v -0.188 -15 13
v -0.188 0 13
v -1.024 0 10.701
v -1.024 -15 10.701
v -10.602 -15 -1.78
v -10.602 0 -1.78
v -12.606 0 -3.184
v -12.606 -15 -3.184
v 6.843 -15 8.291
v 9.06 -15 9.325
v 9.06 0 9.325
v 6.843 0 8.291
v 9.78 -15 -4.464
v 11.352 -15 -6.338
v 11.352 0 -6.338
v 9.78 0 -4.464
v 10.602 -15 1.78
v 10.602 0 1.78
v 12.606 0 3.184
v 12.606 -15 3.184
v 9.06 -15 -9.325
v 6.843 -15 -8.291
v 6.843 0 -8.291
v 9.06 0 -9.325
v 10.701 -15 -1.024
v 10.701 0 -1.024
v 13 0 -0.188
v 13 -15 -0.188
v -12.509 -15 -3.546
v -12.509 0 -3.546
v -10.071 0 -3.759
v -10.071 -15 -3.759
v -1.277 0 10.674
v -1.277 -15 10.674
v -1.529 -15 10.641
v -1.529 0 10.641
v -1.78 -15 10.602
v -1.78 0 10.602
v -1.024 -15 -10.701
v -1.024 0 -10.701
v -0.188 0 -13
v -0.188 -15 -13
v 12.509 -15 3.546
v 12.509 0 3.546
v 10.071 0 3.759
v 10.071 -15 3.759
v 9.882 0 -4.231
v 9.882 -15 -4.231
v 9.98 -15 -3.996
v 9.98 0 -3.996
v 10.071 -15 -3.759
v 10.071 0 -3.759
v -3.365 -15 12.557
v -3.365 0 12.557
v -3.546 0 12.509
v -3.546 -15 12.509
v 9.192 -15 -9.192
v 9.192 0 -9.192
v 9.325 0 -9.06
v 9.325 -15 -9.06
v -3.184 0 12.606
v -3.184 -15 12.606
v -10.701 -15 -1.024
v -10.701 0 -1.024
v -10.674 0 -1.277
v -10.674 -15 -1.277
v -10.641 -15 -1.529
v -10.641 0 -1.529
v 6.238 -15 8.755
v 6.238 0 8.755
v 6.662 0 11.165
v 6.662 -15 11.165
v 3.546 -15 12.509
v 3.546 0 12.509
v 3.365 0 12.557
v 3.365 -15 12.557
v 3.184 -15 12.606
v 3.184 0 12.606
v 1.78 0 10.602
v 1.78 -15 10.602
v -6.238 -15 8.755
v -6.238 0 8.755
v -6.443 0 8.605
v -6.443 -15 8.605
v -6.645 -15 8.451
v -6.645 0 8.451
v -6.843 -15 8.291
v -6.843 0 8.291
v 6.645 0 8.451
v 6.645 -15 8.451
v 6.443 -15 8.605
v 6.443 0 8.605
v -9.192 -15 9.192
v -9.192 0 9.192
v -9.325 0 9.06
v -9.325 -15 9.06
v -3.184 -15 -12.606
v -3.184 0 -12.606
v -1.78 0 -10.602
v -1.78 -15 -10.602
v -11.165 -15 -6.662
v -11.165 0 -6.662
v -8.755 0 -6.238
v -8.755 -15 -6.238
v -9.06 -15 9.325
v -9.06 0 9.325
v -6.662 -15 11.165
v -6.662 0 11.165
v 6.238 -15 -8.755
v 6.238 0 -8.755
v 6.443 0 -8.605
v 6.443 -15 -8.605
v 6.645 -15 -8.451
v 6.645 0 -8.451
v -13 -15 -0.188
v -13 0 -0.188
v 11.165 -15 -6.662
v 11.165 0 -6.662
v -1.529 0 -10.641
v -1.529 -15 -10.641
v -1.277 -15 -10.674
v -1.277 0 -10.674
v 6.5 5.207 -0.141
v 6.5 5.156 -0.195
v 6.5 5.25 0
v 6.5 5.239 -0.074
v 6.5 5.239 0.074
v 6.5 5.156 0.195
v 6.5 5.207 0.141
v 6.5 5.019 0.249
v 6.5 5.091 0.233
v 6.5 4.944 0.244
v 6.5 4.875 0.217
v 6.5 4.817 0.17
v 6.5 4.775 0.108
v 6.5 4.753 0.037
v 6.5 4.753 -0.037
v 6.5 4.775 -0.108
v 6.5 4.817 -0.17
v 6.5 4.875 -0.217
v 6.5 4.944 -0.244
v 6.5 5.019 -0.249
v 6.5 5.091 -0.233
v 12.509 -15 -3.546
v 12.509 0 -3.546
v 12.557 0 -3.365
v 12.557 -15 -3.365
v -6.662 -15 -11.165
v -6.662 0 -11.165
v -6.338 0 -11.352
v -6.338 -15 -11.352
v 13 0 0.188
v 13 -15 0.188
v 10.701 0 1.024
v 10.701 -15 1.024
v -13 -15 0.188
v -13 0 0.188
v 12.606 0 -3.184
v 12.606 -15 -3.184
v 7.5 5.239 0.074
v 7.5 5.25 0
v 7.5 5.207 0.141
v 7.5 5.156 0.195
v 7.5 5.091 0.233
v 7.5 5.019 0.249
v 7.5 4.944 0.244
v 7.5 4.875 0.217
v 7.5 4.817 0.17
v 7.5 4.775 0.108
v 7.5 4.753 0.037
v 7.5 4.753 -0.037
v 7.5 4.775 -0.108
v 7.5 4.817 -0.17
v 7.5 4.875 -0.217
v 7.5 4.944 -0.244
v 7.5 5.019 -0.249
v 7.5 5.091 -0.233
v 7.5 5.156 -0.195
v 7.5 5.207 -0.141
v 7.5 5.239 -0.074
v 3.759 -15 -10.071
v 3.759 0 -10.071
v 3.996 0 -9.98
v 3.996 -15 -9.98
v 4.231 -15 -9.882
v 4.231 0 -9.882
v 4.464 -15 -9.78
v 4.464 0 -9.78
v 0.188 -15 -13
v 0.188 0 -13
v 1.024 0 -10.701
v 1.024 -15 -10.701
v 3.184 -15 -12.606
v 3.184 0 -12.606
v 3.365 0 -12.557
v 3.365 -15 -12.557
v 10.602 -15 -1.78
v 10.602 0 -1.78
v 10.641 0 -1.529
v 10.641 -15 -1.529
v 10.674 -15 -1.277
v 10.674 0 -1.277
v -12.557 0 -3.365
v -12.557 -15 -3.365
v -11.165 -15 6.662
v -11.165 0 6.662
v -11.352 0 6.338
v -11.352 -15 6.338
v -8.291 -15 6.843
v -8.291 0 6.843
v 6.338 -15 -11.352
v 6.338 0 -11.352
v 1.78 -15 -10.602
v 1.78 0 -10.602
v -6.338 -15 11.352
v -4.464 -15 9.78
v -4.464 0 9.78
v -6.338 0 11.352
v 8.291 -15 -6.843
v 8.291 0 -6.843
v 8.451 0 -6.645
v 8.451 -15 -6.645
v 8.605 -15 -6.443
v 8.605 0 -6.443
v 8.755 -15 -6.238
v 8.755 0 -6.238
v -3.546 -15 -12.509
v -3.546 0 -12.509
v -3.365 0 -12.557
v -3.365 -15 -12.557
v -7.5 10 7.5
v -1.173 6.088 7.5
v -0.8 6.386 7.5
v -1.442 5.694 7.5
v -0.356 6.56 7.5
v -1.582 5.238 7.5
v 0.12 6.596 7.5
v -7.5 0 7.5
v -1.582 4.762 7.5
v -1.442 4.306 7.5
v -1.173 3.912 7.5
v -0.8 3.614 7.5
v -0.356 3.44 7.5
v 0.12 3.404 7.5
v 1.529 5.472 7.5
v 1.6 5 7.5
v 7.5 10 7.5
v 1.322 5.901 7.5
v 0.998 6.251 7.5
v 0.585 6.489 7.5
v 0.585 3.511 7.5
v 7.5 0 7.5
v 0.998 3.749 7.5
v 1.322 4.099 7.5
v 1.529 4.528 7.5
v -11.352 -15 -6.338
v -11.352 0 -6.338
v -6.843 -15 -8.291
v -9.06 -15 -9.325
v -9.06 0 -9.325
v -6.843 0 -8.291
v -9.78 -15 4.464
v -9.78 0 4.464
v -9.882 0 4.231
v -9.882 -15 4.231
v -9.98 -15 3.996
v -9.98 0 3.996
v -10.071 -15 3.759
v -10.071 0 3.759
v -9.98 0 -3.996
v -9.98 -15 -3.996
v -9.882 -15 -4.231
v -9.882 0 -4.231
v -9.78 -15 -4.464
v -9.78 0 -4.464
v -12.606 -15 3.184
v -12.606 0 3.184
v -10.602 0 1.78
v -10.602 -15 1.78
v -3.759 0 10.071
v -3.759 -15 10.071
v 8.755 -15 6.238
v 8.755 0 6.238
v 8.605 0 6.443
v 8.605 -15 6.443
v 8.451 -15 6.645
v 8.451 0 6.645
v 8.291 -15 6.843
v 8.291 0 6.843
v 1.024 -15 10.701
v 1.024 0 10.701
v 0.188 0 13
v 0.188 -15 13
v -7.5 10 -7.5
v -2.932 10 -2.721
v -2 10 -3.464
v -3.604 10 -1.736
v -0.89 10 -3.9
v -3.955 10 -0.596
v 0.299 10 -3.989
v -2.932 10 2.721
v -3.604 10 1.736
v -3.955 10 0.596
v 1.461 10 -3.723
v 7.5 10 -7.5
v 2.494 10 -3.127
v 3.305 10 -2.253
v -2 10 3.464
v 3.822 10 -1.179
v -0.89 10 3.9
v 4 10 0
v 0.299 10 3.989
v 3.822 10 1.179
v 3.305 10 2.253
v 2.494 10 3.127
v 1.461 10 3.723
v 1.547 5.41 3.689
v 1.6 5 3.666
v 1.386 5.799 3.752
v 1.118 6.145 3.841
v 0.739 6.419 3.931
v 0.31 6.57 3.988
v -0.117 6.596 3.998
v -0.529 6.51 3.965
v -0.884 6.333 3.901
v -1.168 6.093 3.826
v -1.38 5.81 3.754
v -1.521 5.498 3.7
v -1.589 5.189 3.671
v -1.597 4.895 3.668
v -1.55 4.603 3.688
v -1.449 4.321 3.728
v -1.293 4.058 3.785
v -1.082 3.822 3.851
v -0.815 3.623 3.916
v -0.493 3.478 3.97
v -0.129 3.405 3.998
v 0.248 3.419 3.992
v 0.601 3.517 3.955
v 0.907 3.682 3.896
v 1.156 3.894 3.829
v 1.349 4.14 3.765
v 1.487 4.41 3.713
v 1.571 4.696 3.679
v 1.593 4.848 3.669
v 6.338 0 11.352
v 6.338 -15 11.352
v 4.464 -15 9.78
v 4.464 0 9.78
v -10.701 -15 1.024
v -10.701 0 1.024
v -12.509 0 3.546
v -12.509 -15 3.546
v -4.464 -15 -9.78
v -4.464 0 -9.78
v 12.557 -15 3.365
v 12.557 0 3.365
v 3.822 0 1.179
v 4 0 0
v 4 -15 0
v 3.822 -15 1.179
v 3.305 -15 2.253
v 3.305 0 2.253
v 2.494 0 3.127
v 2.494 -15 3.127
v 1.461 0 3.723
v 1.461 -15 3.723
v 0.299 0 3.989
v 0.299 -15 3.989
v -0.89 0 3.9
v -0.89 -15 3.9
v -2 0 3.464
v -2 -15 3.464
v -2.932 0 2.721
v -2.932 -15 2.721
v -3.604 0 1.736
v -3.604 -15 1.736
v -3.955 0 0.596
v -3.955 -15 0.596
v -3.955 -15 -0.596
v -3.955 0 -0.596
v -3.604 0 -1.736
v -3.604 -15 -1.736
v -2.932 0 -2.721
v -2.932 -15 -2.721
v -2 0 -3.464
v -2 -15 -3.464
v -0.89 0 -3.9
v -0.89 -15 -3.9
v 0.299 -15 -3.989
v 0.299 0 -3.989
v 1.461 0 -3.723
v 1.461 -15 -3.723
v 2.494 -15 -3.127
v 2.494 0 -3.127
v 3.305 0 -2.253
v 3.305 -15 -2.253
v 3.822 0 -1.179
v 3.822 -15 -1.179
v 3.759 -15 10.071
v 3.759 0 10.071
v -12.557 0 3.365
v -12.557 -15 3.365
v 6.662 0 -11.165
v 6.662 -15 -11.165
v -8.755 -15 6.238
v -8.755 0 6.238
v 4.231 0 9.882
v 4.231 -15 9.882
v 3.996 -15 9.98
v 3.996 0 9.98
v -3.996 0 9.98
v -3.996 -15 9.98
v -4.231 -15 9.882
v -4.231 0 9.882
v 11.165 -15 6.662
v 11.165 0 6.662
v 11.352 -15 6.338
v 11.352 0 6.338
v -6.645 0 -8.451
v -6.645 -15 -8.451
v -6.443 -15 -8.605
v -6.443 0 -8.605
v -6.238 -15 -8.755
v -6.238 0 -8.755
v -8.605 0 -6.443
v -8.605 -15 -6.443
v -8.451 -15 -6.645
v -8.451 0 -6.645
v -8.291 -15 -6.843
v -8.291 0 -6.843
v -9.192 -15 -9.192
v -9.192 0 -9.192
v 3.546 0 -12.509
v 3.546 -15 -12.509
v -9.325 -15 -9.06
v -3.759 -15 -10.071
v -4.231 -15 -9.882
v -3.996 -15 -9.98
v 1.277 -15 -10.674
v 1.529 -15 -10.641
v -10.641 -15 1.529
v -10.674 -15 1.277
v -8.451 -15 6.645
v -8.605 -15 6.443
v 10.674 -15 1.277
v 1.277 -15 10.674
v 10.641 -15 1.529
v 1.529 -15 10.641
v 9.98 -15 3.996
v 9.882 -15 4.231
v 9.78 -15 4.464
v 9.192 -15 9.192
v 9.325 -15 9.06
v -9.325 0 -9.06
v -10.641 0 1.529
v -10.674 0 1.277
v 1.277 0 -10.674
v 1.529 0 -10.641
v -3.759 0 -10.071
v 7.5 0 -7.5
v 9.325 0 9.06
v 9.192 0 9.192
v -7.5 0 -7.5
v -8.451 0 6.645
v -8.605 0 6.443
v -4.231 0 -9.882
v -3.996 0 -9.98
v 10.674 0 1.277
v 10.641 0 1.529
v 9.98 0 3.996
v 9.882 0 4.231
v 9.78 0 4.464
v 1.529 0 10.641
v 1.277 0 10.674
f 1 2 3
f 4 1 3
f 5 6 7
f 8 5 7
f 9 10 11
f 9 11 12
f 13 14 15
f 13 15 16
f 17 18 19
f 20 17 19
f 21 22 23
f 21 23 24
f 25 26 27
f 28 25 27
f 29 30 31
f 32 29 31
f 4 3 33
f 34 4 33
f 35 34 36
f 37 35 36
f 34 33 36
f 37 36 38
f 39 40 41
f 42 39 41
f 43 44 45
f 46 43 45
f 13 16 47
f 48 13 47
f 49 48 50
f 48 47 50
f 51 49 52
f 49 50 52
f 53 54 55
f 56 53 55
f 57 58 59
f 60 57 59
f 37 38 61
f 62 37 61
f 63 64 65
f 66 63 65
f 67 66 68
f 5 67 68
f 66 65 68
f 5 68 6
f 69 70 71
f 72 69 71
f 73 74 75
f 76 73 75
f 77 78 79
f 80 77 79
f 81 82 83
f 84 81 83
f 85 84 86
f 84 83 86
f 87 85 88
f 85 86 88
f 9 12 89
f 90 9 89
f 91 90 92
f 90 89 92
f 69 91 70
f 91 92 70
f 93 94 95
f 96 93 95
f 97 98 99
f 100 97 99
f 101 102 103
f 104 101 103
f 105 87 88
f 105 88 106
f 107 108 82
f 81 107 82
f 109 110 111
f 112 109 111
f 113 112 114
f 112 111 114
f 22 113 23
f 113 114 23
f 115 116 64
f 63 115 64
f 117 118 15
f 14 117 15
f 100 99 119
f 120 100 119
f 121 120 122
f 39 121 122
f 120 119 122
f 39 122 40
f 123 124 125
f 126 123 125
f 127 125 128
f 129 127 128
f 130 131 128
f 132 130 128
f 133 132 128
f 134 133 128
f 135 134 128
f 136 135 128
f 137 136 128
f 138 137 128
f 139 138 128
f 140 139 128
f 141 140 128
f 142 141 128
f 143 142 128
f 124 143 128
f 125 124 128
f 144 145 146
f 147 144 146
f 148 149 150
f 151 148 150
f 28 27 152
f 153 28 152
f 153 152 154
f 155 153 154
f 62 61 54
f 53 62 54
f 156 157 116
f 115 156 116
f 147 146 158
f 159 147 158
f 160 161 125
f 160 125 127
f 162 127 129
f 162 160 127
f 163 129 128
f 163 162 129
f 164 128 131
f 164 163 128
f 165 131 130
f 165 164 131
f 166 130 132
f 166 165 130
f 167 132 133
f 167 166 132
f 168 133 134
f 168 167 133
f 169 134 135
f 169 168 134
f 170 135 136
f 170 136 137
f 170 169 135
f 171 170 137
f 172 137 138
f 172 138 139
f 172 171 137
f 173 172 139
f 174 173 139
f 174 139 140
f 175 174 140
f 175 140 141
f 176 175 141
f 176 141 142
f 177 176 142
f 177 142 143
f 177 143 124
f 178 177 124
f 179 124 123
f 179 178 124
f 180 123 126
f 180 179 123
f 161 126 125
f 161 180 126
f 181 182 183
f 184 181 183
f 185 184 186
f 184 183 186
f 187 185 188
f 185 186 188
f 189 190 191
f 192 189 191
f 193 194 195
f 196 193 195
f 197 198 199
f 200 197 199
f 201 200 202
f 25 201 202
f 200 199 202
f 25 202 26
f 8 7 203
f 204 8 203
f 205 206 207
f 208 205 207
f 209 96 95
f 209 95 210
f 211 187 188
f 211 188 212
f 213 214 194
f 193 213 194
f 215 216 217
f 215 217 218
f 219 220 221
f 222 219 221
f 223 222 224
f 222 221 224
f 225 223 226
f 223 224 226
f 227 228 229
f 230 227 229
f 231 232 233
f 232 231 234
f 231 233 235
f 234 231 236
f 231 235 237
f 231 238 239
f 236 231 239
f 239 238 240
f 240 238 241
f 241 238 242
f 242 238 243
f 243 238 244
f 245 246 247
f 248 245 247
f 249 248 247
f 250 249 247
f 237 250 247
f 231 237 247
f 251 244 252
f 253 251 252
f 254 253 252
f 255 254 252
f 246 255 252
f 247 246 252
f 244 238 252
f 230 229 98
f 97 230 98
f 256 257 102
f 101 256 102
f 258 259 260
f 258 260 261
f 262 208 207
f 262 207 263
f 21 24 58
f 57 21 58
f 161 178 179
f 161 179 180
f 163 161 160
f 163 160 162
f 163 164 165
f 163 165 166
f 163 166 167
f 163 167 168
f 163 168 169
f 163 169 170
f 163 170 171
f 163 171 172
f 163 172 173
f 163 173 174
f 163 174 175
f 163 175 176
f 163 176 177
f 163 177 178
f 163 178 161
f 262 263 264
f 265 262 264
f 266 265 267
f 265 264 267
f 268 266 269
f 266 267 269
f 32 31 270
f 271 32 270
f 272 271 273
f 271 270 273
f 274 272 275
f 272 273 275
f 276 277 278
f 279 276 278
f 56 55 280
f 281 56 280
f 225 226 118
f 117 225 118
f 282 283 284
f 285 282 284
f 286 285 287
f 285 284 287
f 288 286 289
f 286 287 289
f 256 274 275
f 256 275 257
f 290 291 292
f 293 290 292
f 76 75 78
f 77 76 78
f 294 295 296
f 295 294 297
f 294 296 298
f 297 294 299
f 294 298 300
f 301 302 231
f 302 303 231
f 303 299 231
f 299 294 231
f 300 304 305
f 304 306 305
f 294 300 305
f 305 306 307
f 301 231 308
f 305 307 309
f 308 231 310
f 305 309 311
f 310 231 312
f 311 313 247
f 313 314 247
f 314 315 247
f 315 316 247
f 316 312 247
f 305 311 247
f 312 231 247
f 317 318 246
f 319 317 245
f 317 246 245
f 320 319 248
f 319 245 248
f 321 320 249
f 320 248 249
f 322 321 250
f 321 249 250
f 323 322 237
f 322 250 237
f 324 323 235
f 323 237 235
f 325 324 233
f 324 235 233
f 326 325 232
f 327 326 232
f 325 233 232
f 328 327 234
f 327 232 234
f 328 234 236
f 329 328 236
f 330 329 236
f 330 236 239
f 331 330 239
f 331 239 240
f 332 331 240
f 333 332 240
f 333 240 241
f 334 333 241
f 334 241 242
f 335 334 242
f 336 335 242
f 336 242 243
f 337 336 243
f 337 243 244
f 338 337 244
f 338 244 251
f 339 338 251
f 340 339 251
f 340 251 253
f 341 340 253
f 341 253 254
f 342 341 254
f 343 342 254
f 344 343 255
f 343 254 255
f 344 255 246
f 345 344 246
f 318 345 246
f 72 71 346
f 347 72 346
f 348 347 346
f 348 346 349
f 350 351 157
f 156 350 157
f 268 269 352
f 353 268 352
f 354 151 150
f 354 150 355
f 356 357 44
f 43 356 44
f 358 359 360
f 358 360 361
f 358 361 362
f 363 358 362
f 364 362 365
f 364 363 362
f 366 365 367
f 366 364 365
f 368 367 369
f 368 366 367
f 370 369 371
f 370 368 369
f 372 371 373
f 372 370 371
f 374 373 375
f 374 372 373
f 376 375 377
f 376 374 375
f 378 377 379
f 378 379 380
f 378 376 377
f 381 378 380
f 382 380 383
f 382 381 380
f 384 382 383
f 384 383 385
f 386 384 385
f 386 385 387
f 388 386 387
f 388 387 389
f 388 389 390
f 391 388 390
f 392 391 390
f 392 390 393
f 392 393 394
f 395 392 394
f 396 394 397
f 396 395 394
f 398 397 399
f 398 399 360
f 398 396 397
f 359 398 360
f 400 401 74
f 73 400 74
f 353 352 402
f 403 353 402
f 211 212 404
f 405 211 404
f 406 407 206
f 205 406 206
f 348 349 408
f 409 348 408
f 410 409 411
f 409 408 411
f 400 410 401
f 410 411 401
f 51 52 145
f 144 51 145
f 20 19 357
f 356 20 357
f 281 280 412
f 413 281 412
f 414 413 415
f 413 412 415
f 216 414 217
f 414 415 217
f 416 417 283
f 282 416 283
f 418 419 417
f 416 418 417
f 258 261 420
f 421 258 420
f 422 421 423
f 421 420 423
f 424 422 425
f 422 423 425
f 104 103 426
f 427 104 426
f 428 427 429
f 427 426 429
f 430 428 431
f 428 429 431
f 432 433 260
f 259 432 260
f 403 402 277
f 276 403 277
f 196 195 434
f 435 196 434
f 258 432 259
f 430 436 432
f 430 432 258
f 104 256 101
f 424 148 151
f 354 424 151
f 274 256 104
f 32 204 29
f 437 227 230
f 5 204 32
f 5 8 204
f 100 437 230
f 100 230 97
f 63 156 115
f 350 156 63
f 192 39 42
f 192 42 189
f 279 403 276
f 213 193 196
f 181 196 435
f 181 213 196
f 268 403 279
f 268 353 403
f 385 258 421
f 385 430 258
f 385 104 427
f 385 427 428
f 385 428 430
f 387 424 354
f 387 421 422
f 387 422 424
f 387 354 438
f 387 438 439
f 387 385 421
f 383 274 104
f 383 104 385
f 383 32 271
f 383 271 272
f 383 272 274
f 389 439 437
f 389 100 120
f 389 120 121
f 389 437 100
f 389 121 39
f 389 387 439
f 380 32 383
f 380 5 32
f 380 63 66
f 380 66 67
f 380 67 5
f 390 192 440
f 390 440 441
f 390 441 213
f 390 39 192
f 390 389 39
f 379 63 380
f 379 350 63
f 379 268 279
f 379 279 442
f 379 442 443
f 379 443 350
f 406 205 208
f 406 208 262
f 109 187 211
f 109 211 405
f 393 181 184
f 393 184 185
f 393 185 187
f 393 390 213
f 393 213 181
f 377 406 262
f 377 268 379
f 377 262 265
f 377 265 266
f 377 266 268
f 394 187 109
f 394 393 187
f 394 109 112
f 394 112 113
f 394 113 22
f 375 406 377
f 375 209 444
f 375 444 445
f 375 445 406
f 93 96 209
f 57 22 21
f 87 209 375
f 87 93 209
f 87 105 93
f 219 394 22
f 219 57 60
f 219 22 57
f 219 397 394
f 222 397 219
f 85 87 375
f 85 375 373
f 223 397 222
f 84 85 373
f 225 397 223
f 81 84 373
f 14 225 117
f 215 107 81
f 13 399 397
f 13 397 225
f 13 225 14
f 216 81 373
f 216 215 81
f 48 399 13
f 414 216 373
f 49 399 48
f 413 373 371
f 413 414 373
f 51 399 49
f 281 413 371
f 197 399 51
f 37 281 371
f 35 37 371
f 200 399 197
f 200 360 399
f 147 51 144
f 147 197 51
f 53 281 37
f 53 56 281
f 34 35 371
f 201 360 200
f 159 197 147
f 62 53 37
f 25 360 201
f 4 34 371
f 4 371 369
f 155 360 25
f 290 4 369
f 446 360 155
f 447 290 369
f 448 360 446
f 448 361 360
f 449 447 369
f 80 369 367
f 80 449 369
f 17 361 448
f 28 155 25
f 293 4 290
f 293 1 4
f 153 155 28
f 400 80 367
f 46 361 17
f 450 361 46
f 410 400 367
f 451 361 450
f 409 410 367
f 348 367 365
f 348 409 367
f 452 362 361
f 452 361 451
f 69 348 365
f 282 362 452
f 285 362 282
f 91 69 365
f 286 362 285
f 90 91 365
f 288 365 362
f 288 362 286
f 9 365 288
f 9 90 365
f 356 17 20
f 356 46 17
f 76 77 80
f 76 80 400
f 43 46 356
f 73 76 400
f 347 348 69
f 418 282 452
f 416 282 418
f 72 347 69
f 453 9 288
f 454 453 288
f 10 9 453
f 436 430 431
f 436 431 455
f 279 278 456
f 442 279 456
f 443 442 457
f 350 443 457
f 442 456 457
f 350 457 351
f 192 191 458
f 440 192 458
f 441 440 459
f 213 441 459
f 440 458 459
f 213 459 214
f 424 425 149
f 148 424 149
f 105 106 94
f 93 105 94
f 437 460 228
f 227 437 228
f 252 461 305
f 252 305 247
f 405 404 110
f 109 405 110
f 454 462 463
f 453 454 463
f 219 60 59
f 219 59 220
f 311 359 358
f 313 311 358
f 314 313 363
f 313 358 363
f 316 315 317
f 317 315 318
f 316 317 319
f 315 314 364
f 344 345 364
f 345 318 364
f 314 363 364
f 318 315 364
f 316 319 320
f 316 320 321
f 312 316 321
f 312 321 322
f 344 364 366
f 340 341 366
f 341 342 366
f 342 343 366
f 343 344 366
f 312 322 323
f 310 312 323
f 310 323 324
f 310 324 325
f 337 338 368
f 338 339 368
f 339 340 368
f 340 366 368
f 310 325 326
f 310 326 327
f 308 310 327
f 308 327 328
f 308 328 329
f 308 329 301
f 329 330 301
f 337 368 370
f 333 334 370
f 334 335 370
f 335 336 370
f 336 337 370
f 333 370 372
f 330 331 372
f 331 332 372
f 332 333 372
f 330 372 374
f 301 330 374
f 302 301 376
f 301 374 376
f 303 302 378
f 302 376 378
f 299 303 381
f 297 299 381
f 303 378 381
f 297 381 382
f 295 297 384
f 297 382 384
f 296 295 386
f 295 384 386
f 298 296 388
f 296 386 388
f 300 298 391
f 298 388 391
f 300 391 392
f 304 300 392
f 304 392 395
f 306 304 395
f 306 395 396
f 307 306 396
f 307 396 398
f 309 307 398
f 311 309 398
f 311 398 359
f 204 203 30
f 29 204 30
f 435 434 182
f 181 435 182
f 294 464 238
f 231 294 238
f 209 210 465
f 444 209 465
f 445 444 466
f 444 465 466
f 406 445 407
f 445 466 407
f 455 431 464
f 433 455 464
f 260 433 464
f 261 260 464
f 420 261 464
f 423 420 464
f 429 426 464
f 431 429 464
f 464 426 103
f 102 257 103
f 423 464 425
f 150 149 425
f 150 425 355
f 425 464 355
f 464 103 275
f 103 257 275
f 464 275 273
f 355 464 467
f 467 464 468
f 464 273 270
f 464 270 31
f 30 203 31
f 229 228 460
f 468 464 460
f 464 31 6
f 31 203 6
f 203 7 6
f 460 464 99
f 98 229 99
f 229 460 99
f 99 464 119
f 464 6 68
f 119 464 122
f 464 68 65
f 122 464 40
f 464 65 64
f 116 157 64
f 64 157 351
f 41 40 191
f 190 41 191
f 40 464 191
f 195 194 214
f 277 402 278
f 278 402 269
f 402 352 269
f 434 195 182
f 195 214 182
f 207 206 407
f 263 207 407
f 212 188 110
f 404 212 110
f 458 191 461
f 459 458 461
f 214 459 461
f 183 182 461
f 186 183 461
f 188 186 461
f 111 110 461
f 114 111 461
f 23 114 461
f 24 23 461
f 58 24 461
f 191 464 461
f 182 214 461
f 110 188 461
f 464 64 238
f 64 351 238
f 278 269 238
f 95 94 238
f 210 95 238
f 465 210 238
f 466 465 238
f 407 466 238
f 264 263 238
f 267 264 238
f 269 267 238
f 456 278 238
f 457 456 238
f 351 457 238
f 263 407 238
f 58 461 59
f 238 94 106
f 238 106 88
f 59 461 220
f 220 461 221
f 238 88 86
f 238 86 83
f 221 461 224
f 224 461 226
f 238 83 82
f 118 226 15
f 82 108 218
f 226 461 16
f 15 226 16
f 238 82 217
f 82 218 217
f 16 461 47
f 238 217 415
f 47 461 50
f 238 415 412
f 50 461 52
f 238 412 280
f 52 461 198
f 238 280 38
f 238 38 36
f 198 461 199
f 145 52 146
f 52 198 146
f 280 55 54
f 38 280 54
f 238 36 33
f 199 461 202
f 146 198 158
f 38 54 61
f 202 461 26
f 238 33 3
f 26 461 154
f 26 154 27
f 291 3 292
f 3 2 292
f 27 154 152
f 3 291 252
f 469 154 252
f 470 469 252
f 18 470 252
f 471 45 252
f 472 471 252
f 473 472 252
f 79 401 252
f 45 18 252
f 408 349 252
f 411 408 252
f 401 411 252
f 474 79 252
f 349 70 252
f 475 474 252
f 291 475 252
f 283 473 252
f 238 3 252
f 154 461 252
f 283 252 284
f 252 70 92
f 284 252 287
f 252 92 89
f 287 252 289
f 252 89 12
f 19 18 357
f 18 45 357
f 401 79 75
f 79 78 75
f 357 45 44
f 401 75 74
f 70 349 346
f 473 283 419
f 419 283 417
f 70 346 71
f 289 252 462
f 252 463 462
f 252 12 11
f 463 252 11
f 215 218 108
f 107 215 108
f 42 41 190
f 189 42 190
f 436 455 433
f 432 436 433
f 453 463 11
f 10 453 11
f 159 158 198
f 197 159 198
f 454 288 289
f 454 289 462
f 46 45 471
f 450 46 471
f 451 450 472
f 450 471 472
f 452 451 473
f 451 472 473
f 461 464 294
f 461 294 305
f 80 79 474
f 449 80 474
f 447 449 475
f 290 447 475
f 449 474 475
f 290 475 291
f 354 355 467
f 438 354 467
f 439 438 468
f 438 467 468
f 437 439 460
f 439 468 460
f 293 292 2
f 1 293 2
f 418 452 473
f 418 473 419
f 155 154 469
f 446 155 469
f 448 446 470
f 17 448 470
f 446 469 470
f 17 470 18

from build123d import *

# Parameters (mm, degrees)
F0_R     = 4
F1_DEPTH = 15
F2_W     = 15
F2_H     = 15
F2_R     = 4
F3_DEPTH = 10
F4_R     = 1.6
F5_DEPTH = 4.833939544
F6_R     = 0.25
F7_DEPTH = 1


with BuildPart() as f1:
    # F0 (on Front) → F1 (new body)
    with BuildSketch(Plane.XZ):
        with BuildLine():
            ThreePointArc((10.701095609, -1.0242327697), (10.7377669419, -0.5126998162), (10.75, 0))
            ThreePointArc((10.75, 0), (10.7377669419, 0.5126998162), (10.701095609, 1.0242327697))
            ThreePointArc((10.701095609, 1.0242327697), (10.6580322598, 1.4031565664), (10.6015555658, 1.7803144627))
            ThreePointArc((10.6015555658, 1.7803144627), (10.3837026326, 2.7823047349), (10.0713736709, 3.7589802315))
            ThreePointArc((10.0713736709, 3.7589802315), (9.9317049745, 4.1138468979), (9.7795370306, 4.4635362065))
            ThreePointArc((9.7795370306, 4.4635362065), (9.3097730907, 5.375), (8.7553042609, 6.2375594025))
            ThreePointArc((8.7553042609, 6.2375594025), (8.5285484081, 6.5441853618), (8.2910592083, 6.8425753343))
            ThreePointArc((8.2910592083, 6.8425753343), (7.6013978978, 7.6013978978), (6.8425753343, 8.2910592083))
            ThreePointArc((6.8425753343, 8.2910592083), (6.5441853618, 8.5285484081), (6.2375594025, 8.7553042609))
            ThreePointArc((6.2375594025, 8.7553042609), (5.375, 9.3097730907), (4.4635362065, 9.7795370306))
            ThreePointArc((4.4635362065, 9.7795370306), (4.1138468979, 9.9317049745), (3.7589802315, 10.0713736709))
            ThreePointArc((3.7589802315, 10.0713736709), (2.7823047349, 10.3837026326), (1.7803144627, 10.6015555658))
            ThreePointArc((1.7803144627, 10.6015555658), (1.4031565664, 10.6580322598), (1.0242327697, 10.701095609))
            ThreePointArc((1.0242327697, 10.701095609), (0, 10.75), (-1.0242327697, 10.701095609))
            ThreePointArc((-1.0242327697, 10.701095609), (-1.4031565664, 10.6580322598), (-1.7803144627, 10.6015555658))
            ThreePointArc((-1.7803144627, 10.6015555658), (-2.7823047349, 10.3837026326), (-3.7589802315, 10.0713736709))
            ThreePointArc((-3.7589802315, 10.0713736709), (-4.1138468979, 9.9317049745), (-4.4635362065, 9.7795370306))
            ThreePointArc((-4.4635362065, 9.7795370306), (-5.375, 9.3097730907), (-6.2375594025, 8.7553042609))
            ThreePointArc((-6.2375594025, 8.7553042609), (-6.5441853618, 8.5285484081), (-6.8425753343, 8.2910592083))
            ThreePointArc((-6.8425753343, 8.2910592083), (-7.6013978978, 7.6013978978), (-8.2910592083, 6.8425753343))
            ThreePointArc((-8.2910592083, 6.8425753343), (-8.5285484081, 6.5441853618), (-8.7553042609, 6.2375594025))
            ThreePointArc((-8.7553042609, 6.2375594025), (-9.3097730907, 5.375), (-9.7795370306, 4.4635362065))
            ThreePointArc((-9.7795370306, 4.4635362065), (-9.9317049745, 4.1138468979), (-10.0713736709, 3.7589802315))
            ThreePointArc((-10.0713736709, 3.7589802315), (-10.3837026326, 2.7823047349), (-10.6015555658, 1.7803144627))
            ThreePointArc((-10.6015555658, 1.7803144627), (-10.6580322598, 1.4031565664), (-10.701095609, 1.0242327697))
            ThreePointArc((-10.701095609, 1.0242327697), (-10.75, 0), (-10.701095609, -1.0242327697))
            ThreePointArc((-10.701095609, -1.0242327697), (-10.6580322598, -1.4031565664), (-10.6015555658, -1.7803144627))
            ThreePointArc((-10.6015555658, -1.7803144627), (-10.3837026326, -2.7823047349), (-10.0713736709, -3.7589802315))
            ThreePointArc((-10.0713736709, -3.7589802315), (-9.9317049745, -4.1138468979), (-9.7795370306, -4.4635362065))
            ThreePointArc((-9.7795370306, -4.4635362065), (-9.3097730907, -5.375), (-8.7553042609, -6.2375594025))
            ThreePointArc((-8.7553042609, -6.2375594025), (-8.5285484081, -6.5441853618), (-8.2910592083, -6.8425753343))
            ThreePointArc((-8.2910592083, -6.8425753343), (-7.6013978978, -7.6013978978), (-6.8425753343, -8.2910592083))
            ThreePointArc((-6.8425753343, -8.2910592083), (-6.5441853618, -8.5285484081), (-6.2375594025, -8.7553042609))
            ThreePointArc((-6.2375594025, -8.7553042609), (-5.375, -9.3097730907), (-4.4635362065, -9.7795370306))
            ThreePointArc((-4.4635362065, -9.7795370306), (-4.1138468979, -9.9317049745), (-3.7589802315, -10.0713736709))
            ThreePointArc((-3.7589802315, -10.0713736709), (-2.7823047349, -10.3837026326), (-1.7803144627, -10.6015555658))
            ThreePointArc((-1.7803144627, -10.6015555658), (-1.4031565664, -10.6580322598), (-1.0242327697, -10.701095609))
            ThreePointArc((-1.0242327697, -10.701095609), (0, -10.75), (1.0242327697, -10.701095609))
            ThreePointArc((1.0242327697, -10.701095609), (1.4031565664, -10.6580322598), (1.7803144627, -10.6015555658))
            ThreePointArc((1.7803144627, -10.6015555658), (2.7823047349, -10.3837026326), (3.7589802315, -10.0713736709))
            ThreePointArc((3.7589802315, -10.0713736709), (4.1138468979, -9.9317049745), (4.4635362065, -9.7795370306))
            ThreePointArc((4.4635362065, -9.7795370306), (5.375, -9.3097730907), (6.2375594025, -8.7553042609))
            ThreePointArc((6.2375594025, -8.7553042609), (6.5441853618, -8.5285484081), (6.8425753343, -8.2910592083))
            ThreePointArc((6.8425753343, -8.2910592083), (7.6013978978, -7.6013978978), (8.2910592083, -6.8425753343))
            ThreePointArc((8.2910592083, -6.8425753343), (8.5285484081, -6.5441853618), (8.7553042609, -6.2375594025))
            ThreePointArc((8.7553042609, -6.2375594025), (9.3097730907, -5.375), (9.7795370306, -4.4635362065))
            ThreePointArc((9.7795370306, -4.4635362065), (9.9317049745, -4.1138468979), (10.0713736709, -3.7589802315))
            ThreePointArc((10.0713736709, -3.7589802315), (10.3837026326, -2.7823047349), (10.6015555658, -1.7803144627))
            ThreePointArc((10.6015555658, -1.7803144627), (10.6580322598, -1.4031565664), (10.701095609, -1.0242327697))
        make_face()
        Circle(F0_R, mode=Mode.SUBTRACT)
        with BuildLine():
            ThreePointArc((10.701095609, 1.0242327697), (10.7377669419, 0.5126998162), (10.75, 0))
            ThreePointArc((10.75, 0), (10.7377669419, -0.5126998162), (10.701095609, -1.0242327697))
            Line((10.701095609, -1.0242327697), (13, -0.1875))
            Line((13, -0.1875), (13, 0))
            Line((13, 0), (13, 0.1875))
            Line((13, 0.1875), (10.701095609, 1.0242327697))
        make_face()
        with BuildLine():
            ThreePointArc((10.0713736709, 3.7589802315), (10.3837026326, 2.7823047349), (10.6015555658, 1.7803144627))
            Line((10.6015555658, 1.7803144627), (12.6055643127, 3.1835364939))
            Line((12.6055643127, 3.1835364939), (12.5570357418, 3.3646475863))
            Line((12.5570357418, 3.3646475863), (12.5085071708, 3.5457586788))
            Line((12.5085071708, 3.5457586788), (10.0713736709, 3.7589802315))
        make_face()
        with BuildLine():
            Line((12.6055643127, -3.1835364939), (10.6015555658, -1.7803144627))
            ThreePointArc((10.6015555658, -1.7803144627), (10.3837026326, -2.7823047349), (10.0713736709, -3.7589802315))
            Line((10.0713736709, -3.7589802315), (12.5085071708, -3.5457586788))
            Line((12.5085071708, -3.5457586788), (12.5570357418, -3.3646475863))
            Line((12.5570357418, -3.3646475863), (12.6055643127, -3.1835364939))
        make_face()
        with BuildLine():
            ThreePointArc((8.7553042609, 6.2375594025), (9.3097730907, 5.375), (9.7795370306, 4.4635362065))
            Line((9.7795370306, 4.4635362065), (11.3520802492, 6.3376202368))
            Line((11.3520802492, 6.3376202368), (11.2583302492, 6.5))
            Line((11.2583302492, 6.5), (11.1645802492, 6.6623797632))
            Line((11.1645802492, 6.6623797632), (8.7553042609, 6.2375594025))
        make_face()
        with BuildLine():
            Line((11.3520802492, -6.3376202368), (9.7795370306, -4.4635362065))
            ThreePointArc((9.7795370306, -4.4635362065), (9.3097730907, -5.375), (8.7553042609, -6.2375594025))
            Line((8.7553042609, -6.2375594025), (11.1645802492, -6.6623797632))
            Line((11.1645802492, -6.6623797632), (11.2583302492, -6.5))
            Line((11.2583302492, -6.5), (11.3520802492, -6.3376202368))
        make_face()
        with BuildLine():
            ThreePointArc((6.8425753343, 8.2910592083), (7.6013978978, 7.6013978978), (8.2910592083, 6.8425753343))
            Line((8.2910592083, 6.8425753343), (9.3249706769, 9.059805634))
            Line((9.3249706769, 9.059805634), (9.1923881554, 9.1923881554))
            Line((9.1923881554, 9.1923881554), (9.059805634, 9.3249706769))
            Line((9.059805634, 9.3249706769), (6.8425753343, 8.2910592083))
        make_face()
        with BuildLine():
            Line((9.3249706769, -9.059805634), (8.2910592083, -6.8425753343))
            ThreePointArc((8.2910592083, -6.8425753343), (7.6013978978, -7.6013978978), (6.8425753343, -8.2910592083))
            Line((6.8425753343, -8.2910592083), (9.059805634, -9.3249706769))
            Line((9.059805634, -9.3249706769), (9.1923881554, -9.1923881554))
            Line((9.1923881554, -9.1923881554), (9.3249706769, -9.059805634))
        make_face()
        with BuildLine():
            ThreePointArc((4.4635362065, 9.7795370306), (5.375, 9.3097730907), (6.2375594025, 8.7553042609))
            Line((6.2375594025, 8.7553042609), (6.6623797632, 11.1645802492))
            Line((6.6623797632, 11.1645802492), (6.5, 11.2583302492))
            Line((6.5, 11.2583302492), (6.3376202368, 11.3520802492))
            Line((6.3376202368, 11.3520802492), (4.4635362065, 9.7795370306))
        make_face()
        with BuildLine():
            Line((6.6623797632, -11.1645802492), (6.2375594025, -8.7553042609))
            ThreePointArc((6.2375594025, -8.7553042609), (5.375, -9.3097730907), (4.4635362065, -9.7795370306))
            Line((4.4635362065, -9.7795370306), (6.3376202368, -11.3520802492))
            Line((6.3376202368, -11.3520802492), (6.5, -11.2583302492))
            Line((6.5, -11.2583302492), (6.6623797632, -11.1645802492))
        make_face()
        with BuildLine():
            ThreePointArc((1.7803144627, 10.6015555658), (2.7823047349, 10.3837026326), (3.7589802315, 10.0713736709))
            Line((3.7589802315, 10.0713736709), (3.5457586788, 12.5085071708))
            Line((3.5457586788, 12.5085071708), (3.3646475863, 12.5570357418))
            Line((3.3646475863, 12.5570357418), (3.1835364939, 12.6055643127))
            Line((3.1835364939, 12.6055643127), (1.7803144627, 10.6015555658))
        make_face()
        with BuildLine():
            Line((3.5457586788, -12.5085071708), (3.7589802315, -10.0713736709))
            ThreePointArc((3.7589802315, -10.0713736709), (2.7823047349, -10.3837026326), (1.7803144627, -10.6015555658))
            Line((1.7803144627, -10.6015555658), (3.1835364939, -12.6055643127))
            Line((3.1835364939, -12.6055643127), (3.3646475863, -12.5570357418))
            Line((3.3646475863, -12.5570357418), (3.5457586788, -12.5085071708))
        make_face()
        with BuildLine():
            ThreePointArc((-1.0242327697, 10.701095609), (0, 10.75), (1.0242327697, 10.701095609))
            Line((1.0242327697, 10.701095609), (0.1875, 13))
            Line((0.1875, 13), (0, 13))
            Line((0, 13), (-0.1875, 13))
            Line((-0.1875, 13), (-1.0242327697, 10.701095609))
        make_face()
        with BuildLine():
            Line((0.1875, -13), (1.0242327697, -10.701095609))
            ThreePointArc((1.0242327697, -10.701095609), (0, -10.75), (-1.0242327697, -10.701095609))
            Line((-1.0242327697, -10.701095609), (-0.1875, -13))
            Line((-0.1875, -13), (0, -13))
            Line((0, -13), (0.1875, -13))
        make_face()
        with BuildLine():
            ThreePointArc((-3.7589802315, 10.0713736709), (-2.7823047349, 10.3837026326), (-1.7803144627, 10.6015555658))
            Line((-1.7803144627, 10.6015555658), (-3.1835364939, 12.6055643127))
            Line((-3.1835364939, 12.6055643127), (-3.3646475863, 12.5570357418))
            Line((-3.3646475863, 12.5570357418), (-3.5457586788, 12.5085071708))
            Line((-3.5457586788, 12.5085071708), (-3.7589802315, 10.0713736709))
        make_face()
        with BuildLine():
            Line((-3.1835364939, -12.6055643127), (-1.7803144627, -10.6015555658))
            ThreePointArc((-1.7803144627, -10.6015555658), (-2.7823047349, -10.3837026326), (-3.7589802315, -10.0713736709))
            Line((-3.7589802315, -10.0713736709), (-3.5457586788, -12.5085071708))
            Line((-3.5457586788, -12.5085071708), (-3.3646475863, -12.5570357418))
            Line((-3.3646475863, -12.5570357418), (-3.1835364939, -12.6055643127))
        make_face()
        with BuildLine():
            ThreePointArc((-6.2375594025, 8.7553042609), (-5.375, 9.3097730907), (-4.4635362065, 9.7795370306))
            Line((-4.4635362065, 9.7795370306), (-6.3376202368, 11.3520802492))
            Line((-6.3376202368, 11.3520802492), (-6.5, 11.2583302492))
            Line((-6.5, 11.2583302492), (-6.6623797632, 11.1645802492))
            Line((-6.6623797632, 11.1645802492), (-6.2375594025, 8.7553042609))
        make_face()
        with BuildLine():
            Line((-6.3376202368, -11.3520802492), (-4.4635362065, -9.7795370306))
            ThreePointArc((-4.4635362065, -9.7795370306), (-5.375, -9.3097730907), (-6.2375594025, -8.7553042609))
            Line((-6.2375594025, -8.7553042609), (-6.6623797632, -11.1645802492))
            Line((-6.6623797632, -11.1645802492), (-6.5, -11.2583302492))
            Line((-6.5, -11.2583302492), (-6.3376202368, -11.3520802492))
        make_face()
        with BuildLine():
            ThreePointArc((-8.2910592083, 6.8425753343), (-7.6013978978, 7.6013978978), (-6.8425753343, 8.2910592083))
            Line((-6.8425753343, 8.2910592083), (-9.059805634, 9.3249706769))
            Line((-9.059805634, 9.3249706769), (-9.1923881554, 9.1923881554))
            Line((-9.1923881554, 9.1923881554), (-9.3249706769, 9.059805634))
            Line((-9.3249706769, 9.059805634), (-8.2910592083, 6.8425753343))
        make_face()
        with BuildLine():
            Line((-9.059805634, -9.3249706769), (-6.8425753343, -8.2910592083))
            ThreePointArc((-6.8425753343, -8.2910592083), (-7.6013978978, -7.6013978978), (-8.2910592083, -6.8425753343))
            Line((-8.2910592083, -6.8425753343), (-9.3249706769, -9.059805634))
            Line((-9.3249706769, -9.059805634), (-9.1923881554, -9.1923881554))
            Line((-9.1923881554, -9.1923881554), (-9.059805634, -9.3249706769))
        make_face()
        with BuildLine():
            ThreePointArc((-9.7795370306, 4.4635362065), (-9.3097730907, 5.375), (-8.7553042609, 6.2375594025))
            Line((-8.7553042609, 6.2375594025), (-11.1645802492, 6.6623797632))
            Line((-11.1645802492, 6.6623797632), (-11.2583302492, 6.5))
            Line((-11.2583302492, 6.5), (-11.3520802492, 6.3376202368))
            Line((-11.3520802492, 6.3376202368), (-9.7795370306, 4.4635362065))
        make_face()
        with BuildLine():
            Line((-11.1645802492, -6.6623797632), (-8.7553042609, -6.2375594025))
            ThreePointArc((-8.7553042609, -6.2375594025), (-9.3097730907, -5.375), (-9.7795370306, -4.4635362065))
            Line((-9.7795370306, -4.4635362065), (-11.3520802492, -6.3376202368))
            Line((-11.3520802492, -6.3376202368), (-11.2583302492, -6.5))
            Line((-11.2583302492, -6.5), (-11.1645802492, -6.6623797632))
        make_face()
        with BuildLine():
            ThreePointArc((-10.6015555658, 1.7803144627), (-10.3837026326, 2.7823047349), (-10.0713736709, 3.7589802315))
            Line((-10.0713736709, 3.7589802315), (-12.5085071708, 3.5457586788))
            Line((-12.5085071708, 3.5457586788), (-12.5570357418, 3.3646475863))
            Line((-12.5570357418, 3.3646475863), (-12.6055643127, 3.1835364939))
            Line((-12.6055643127, 3.1835364939), (-10.6015555658, 1.7803144627))
        make_face()
        with BuildLine():
            Line((-12.5085071708, -3.5457586788), (-10.0713736709, -3.7589802315))
            ThreePointArc((-10.0713736709, -3.7589802315), (-10.3837026326, -2.7823047349), (-10.6015555658, -1.7803144627))
            Line((-10.6015555658, -1.7803144627), (-12.6055643127, -3.1835364939))
            Line((-12.6055643127, -3.1835364939), (-12.5570357418, -3.3646475863))
            Line((-12.5570357418, -3.3646475863), (-12.5085071708, -3.5457586788))
        make_face()
        with BuildLine():
            ThreePointArc((-10.701095609, -1.0242327697), (-10.75, 0), (-10.701095609, 1.0242327697))
            Line((-10.701095609, 1.0242327697), (-13, 0.1875))
            Line((-13, 0.1875), (-13, 0))
            Line((-13, 0), (-13, -0.1875))
            Line((-13, -0.1875), (-10.701095609, -1.0242327697))
        make_face()
    extrude(amount=F1_DEPTH)

    # F2 (on Front) → F3 (join)
    with BuildSketch(Plane.XZ):
        Rectangle(F2_W, F2_H)
        Circle(F2_R, mode=Mode.SUBTRACT)
    extrude(amount=-F3_DEPTH)

    # F4 (on face) → F5 (cut, up to face)
    with BuildSketch(Plane.XY.offset(7.5)):
        with Locations((0, 5)):
            Circle(F4_R)
    extrude(amount=-F5_DEPTH, mode=Mode.SUBTRACT)


with BuildPart() as f7:
    # F6 (on face) → F7 (new body)
    with BuildSketch(Plane.YZ.offset(7.5)):
        with Locations((5, 0)):
            Circle(F6_R)
    extrude(amount=-F7_DEPTH)


solid = Compound([f1.part, f7.part])
